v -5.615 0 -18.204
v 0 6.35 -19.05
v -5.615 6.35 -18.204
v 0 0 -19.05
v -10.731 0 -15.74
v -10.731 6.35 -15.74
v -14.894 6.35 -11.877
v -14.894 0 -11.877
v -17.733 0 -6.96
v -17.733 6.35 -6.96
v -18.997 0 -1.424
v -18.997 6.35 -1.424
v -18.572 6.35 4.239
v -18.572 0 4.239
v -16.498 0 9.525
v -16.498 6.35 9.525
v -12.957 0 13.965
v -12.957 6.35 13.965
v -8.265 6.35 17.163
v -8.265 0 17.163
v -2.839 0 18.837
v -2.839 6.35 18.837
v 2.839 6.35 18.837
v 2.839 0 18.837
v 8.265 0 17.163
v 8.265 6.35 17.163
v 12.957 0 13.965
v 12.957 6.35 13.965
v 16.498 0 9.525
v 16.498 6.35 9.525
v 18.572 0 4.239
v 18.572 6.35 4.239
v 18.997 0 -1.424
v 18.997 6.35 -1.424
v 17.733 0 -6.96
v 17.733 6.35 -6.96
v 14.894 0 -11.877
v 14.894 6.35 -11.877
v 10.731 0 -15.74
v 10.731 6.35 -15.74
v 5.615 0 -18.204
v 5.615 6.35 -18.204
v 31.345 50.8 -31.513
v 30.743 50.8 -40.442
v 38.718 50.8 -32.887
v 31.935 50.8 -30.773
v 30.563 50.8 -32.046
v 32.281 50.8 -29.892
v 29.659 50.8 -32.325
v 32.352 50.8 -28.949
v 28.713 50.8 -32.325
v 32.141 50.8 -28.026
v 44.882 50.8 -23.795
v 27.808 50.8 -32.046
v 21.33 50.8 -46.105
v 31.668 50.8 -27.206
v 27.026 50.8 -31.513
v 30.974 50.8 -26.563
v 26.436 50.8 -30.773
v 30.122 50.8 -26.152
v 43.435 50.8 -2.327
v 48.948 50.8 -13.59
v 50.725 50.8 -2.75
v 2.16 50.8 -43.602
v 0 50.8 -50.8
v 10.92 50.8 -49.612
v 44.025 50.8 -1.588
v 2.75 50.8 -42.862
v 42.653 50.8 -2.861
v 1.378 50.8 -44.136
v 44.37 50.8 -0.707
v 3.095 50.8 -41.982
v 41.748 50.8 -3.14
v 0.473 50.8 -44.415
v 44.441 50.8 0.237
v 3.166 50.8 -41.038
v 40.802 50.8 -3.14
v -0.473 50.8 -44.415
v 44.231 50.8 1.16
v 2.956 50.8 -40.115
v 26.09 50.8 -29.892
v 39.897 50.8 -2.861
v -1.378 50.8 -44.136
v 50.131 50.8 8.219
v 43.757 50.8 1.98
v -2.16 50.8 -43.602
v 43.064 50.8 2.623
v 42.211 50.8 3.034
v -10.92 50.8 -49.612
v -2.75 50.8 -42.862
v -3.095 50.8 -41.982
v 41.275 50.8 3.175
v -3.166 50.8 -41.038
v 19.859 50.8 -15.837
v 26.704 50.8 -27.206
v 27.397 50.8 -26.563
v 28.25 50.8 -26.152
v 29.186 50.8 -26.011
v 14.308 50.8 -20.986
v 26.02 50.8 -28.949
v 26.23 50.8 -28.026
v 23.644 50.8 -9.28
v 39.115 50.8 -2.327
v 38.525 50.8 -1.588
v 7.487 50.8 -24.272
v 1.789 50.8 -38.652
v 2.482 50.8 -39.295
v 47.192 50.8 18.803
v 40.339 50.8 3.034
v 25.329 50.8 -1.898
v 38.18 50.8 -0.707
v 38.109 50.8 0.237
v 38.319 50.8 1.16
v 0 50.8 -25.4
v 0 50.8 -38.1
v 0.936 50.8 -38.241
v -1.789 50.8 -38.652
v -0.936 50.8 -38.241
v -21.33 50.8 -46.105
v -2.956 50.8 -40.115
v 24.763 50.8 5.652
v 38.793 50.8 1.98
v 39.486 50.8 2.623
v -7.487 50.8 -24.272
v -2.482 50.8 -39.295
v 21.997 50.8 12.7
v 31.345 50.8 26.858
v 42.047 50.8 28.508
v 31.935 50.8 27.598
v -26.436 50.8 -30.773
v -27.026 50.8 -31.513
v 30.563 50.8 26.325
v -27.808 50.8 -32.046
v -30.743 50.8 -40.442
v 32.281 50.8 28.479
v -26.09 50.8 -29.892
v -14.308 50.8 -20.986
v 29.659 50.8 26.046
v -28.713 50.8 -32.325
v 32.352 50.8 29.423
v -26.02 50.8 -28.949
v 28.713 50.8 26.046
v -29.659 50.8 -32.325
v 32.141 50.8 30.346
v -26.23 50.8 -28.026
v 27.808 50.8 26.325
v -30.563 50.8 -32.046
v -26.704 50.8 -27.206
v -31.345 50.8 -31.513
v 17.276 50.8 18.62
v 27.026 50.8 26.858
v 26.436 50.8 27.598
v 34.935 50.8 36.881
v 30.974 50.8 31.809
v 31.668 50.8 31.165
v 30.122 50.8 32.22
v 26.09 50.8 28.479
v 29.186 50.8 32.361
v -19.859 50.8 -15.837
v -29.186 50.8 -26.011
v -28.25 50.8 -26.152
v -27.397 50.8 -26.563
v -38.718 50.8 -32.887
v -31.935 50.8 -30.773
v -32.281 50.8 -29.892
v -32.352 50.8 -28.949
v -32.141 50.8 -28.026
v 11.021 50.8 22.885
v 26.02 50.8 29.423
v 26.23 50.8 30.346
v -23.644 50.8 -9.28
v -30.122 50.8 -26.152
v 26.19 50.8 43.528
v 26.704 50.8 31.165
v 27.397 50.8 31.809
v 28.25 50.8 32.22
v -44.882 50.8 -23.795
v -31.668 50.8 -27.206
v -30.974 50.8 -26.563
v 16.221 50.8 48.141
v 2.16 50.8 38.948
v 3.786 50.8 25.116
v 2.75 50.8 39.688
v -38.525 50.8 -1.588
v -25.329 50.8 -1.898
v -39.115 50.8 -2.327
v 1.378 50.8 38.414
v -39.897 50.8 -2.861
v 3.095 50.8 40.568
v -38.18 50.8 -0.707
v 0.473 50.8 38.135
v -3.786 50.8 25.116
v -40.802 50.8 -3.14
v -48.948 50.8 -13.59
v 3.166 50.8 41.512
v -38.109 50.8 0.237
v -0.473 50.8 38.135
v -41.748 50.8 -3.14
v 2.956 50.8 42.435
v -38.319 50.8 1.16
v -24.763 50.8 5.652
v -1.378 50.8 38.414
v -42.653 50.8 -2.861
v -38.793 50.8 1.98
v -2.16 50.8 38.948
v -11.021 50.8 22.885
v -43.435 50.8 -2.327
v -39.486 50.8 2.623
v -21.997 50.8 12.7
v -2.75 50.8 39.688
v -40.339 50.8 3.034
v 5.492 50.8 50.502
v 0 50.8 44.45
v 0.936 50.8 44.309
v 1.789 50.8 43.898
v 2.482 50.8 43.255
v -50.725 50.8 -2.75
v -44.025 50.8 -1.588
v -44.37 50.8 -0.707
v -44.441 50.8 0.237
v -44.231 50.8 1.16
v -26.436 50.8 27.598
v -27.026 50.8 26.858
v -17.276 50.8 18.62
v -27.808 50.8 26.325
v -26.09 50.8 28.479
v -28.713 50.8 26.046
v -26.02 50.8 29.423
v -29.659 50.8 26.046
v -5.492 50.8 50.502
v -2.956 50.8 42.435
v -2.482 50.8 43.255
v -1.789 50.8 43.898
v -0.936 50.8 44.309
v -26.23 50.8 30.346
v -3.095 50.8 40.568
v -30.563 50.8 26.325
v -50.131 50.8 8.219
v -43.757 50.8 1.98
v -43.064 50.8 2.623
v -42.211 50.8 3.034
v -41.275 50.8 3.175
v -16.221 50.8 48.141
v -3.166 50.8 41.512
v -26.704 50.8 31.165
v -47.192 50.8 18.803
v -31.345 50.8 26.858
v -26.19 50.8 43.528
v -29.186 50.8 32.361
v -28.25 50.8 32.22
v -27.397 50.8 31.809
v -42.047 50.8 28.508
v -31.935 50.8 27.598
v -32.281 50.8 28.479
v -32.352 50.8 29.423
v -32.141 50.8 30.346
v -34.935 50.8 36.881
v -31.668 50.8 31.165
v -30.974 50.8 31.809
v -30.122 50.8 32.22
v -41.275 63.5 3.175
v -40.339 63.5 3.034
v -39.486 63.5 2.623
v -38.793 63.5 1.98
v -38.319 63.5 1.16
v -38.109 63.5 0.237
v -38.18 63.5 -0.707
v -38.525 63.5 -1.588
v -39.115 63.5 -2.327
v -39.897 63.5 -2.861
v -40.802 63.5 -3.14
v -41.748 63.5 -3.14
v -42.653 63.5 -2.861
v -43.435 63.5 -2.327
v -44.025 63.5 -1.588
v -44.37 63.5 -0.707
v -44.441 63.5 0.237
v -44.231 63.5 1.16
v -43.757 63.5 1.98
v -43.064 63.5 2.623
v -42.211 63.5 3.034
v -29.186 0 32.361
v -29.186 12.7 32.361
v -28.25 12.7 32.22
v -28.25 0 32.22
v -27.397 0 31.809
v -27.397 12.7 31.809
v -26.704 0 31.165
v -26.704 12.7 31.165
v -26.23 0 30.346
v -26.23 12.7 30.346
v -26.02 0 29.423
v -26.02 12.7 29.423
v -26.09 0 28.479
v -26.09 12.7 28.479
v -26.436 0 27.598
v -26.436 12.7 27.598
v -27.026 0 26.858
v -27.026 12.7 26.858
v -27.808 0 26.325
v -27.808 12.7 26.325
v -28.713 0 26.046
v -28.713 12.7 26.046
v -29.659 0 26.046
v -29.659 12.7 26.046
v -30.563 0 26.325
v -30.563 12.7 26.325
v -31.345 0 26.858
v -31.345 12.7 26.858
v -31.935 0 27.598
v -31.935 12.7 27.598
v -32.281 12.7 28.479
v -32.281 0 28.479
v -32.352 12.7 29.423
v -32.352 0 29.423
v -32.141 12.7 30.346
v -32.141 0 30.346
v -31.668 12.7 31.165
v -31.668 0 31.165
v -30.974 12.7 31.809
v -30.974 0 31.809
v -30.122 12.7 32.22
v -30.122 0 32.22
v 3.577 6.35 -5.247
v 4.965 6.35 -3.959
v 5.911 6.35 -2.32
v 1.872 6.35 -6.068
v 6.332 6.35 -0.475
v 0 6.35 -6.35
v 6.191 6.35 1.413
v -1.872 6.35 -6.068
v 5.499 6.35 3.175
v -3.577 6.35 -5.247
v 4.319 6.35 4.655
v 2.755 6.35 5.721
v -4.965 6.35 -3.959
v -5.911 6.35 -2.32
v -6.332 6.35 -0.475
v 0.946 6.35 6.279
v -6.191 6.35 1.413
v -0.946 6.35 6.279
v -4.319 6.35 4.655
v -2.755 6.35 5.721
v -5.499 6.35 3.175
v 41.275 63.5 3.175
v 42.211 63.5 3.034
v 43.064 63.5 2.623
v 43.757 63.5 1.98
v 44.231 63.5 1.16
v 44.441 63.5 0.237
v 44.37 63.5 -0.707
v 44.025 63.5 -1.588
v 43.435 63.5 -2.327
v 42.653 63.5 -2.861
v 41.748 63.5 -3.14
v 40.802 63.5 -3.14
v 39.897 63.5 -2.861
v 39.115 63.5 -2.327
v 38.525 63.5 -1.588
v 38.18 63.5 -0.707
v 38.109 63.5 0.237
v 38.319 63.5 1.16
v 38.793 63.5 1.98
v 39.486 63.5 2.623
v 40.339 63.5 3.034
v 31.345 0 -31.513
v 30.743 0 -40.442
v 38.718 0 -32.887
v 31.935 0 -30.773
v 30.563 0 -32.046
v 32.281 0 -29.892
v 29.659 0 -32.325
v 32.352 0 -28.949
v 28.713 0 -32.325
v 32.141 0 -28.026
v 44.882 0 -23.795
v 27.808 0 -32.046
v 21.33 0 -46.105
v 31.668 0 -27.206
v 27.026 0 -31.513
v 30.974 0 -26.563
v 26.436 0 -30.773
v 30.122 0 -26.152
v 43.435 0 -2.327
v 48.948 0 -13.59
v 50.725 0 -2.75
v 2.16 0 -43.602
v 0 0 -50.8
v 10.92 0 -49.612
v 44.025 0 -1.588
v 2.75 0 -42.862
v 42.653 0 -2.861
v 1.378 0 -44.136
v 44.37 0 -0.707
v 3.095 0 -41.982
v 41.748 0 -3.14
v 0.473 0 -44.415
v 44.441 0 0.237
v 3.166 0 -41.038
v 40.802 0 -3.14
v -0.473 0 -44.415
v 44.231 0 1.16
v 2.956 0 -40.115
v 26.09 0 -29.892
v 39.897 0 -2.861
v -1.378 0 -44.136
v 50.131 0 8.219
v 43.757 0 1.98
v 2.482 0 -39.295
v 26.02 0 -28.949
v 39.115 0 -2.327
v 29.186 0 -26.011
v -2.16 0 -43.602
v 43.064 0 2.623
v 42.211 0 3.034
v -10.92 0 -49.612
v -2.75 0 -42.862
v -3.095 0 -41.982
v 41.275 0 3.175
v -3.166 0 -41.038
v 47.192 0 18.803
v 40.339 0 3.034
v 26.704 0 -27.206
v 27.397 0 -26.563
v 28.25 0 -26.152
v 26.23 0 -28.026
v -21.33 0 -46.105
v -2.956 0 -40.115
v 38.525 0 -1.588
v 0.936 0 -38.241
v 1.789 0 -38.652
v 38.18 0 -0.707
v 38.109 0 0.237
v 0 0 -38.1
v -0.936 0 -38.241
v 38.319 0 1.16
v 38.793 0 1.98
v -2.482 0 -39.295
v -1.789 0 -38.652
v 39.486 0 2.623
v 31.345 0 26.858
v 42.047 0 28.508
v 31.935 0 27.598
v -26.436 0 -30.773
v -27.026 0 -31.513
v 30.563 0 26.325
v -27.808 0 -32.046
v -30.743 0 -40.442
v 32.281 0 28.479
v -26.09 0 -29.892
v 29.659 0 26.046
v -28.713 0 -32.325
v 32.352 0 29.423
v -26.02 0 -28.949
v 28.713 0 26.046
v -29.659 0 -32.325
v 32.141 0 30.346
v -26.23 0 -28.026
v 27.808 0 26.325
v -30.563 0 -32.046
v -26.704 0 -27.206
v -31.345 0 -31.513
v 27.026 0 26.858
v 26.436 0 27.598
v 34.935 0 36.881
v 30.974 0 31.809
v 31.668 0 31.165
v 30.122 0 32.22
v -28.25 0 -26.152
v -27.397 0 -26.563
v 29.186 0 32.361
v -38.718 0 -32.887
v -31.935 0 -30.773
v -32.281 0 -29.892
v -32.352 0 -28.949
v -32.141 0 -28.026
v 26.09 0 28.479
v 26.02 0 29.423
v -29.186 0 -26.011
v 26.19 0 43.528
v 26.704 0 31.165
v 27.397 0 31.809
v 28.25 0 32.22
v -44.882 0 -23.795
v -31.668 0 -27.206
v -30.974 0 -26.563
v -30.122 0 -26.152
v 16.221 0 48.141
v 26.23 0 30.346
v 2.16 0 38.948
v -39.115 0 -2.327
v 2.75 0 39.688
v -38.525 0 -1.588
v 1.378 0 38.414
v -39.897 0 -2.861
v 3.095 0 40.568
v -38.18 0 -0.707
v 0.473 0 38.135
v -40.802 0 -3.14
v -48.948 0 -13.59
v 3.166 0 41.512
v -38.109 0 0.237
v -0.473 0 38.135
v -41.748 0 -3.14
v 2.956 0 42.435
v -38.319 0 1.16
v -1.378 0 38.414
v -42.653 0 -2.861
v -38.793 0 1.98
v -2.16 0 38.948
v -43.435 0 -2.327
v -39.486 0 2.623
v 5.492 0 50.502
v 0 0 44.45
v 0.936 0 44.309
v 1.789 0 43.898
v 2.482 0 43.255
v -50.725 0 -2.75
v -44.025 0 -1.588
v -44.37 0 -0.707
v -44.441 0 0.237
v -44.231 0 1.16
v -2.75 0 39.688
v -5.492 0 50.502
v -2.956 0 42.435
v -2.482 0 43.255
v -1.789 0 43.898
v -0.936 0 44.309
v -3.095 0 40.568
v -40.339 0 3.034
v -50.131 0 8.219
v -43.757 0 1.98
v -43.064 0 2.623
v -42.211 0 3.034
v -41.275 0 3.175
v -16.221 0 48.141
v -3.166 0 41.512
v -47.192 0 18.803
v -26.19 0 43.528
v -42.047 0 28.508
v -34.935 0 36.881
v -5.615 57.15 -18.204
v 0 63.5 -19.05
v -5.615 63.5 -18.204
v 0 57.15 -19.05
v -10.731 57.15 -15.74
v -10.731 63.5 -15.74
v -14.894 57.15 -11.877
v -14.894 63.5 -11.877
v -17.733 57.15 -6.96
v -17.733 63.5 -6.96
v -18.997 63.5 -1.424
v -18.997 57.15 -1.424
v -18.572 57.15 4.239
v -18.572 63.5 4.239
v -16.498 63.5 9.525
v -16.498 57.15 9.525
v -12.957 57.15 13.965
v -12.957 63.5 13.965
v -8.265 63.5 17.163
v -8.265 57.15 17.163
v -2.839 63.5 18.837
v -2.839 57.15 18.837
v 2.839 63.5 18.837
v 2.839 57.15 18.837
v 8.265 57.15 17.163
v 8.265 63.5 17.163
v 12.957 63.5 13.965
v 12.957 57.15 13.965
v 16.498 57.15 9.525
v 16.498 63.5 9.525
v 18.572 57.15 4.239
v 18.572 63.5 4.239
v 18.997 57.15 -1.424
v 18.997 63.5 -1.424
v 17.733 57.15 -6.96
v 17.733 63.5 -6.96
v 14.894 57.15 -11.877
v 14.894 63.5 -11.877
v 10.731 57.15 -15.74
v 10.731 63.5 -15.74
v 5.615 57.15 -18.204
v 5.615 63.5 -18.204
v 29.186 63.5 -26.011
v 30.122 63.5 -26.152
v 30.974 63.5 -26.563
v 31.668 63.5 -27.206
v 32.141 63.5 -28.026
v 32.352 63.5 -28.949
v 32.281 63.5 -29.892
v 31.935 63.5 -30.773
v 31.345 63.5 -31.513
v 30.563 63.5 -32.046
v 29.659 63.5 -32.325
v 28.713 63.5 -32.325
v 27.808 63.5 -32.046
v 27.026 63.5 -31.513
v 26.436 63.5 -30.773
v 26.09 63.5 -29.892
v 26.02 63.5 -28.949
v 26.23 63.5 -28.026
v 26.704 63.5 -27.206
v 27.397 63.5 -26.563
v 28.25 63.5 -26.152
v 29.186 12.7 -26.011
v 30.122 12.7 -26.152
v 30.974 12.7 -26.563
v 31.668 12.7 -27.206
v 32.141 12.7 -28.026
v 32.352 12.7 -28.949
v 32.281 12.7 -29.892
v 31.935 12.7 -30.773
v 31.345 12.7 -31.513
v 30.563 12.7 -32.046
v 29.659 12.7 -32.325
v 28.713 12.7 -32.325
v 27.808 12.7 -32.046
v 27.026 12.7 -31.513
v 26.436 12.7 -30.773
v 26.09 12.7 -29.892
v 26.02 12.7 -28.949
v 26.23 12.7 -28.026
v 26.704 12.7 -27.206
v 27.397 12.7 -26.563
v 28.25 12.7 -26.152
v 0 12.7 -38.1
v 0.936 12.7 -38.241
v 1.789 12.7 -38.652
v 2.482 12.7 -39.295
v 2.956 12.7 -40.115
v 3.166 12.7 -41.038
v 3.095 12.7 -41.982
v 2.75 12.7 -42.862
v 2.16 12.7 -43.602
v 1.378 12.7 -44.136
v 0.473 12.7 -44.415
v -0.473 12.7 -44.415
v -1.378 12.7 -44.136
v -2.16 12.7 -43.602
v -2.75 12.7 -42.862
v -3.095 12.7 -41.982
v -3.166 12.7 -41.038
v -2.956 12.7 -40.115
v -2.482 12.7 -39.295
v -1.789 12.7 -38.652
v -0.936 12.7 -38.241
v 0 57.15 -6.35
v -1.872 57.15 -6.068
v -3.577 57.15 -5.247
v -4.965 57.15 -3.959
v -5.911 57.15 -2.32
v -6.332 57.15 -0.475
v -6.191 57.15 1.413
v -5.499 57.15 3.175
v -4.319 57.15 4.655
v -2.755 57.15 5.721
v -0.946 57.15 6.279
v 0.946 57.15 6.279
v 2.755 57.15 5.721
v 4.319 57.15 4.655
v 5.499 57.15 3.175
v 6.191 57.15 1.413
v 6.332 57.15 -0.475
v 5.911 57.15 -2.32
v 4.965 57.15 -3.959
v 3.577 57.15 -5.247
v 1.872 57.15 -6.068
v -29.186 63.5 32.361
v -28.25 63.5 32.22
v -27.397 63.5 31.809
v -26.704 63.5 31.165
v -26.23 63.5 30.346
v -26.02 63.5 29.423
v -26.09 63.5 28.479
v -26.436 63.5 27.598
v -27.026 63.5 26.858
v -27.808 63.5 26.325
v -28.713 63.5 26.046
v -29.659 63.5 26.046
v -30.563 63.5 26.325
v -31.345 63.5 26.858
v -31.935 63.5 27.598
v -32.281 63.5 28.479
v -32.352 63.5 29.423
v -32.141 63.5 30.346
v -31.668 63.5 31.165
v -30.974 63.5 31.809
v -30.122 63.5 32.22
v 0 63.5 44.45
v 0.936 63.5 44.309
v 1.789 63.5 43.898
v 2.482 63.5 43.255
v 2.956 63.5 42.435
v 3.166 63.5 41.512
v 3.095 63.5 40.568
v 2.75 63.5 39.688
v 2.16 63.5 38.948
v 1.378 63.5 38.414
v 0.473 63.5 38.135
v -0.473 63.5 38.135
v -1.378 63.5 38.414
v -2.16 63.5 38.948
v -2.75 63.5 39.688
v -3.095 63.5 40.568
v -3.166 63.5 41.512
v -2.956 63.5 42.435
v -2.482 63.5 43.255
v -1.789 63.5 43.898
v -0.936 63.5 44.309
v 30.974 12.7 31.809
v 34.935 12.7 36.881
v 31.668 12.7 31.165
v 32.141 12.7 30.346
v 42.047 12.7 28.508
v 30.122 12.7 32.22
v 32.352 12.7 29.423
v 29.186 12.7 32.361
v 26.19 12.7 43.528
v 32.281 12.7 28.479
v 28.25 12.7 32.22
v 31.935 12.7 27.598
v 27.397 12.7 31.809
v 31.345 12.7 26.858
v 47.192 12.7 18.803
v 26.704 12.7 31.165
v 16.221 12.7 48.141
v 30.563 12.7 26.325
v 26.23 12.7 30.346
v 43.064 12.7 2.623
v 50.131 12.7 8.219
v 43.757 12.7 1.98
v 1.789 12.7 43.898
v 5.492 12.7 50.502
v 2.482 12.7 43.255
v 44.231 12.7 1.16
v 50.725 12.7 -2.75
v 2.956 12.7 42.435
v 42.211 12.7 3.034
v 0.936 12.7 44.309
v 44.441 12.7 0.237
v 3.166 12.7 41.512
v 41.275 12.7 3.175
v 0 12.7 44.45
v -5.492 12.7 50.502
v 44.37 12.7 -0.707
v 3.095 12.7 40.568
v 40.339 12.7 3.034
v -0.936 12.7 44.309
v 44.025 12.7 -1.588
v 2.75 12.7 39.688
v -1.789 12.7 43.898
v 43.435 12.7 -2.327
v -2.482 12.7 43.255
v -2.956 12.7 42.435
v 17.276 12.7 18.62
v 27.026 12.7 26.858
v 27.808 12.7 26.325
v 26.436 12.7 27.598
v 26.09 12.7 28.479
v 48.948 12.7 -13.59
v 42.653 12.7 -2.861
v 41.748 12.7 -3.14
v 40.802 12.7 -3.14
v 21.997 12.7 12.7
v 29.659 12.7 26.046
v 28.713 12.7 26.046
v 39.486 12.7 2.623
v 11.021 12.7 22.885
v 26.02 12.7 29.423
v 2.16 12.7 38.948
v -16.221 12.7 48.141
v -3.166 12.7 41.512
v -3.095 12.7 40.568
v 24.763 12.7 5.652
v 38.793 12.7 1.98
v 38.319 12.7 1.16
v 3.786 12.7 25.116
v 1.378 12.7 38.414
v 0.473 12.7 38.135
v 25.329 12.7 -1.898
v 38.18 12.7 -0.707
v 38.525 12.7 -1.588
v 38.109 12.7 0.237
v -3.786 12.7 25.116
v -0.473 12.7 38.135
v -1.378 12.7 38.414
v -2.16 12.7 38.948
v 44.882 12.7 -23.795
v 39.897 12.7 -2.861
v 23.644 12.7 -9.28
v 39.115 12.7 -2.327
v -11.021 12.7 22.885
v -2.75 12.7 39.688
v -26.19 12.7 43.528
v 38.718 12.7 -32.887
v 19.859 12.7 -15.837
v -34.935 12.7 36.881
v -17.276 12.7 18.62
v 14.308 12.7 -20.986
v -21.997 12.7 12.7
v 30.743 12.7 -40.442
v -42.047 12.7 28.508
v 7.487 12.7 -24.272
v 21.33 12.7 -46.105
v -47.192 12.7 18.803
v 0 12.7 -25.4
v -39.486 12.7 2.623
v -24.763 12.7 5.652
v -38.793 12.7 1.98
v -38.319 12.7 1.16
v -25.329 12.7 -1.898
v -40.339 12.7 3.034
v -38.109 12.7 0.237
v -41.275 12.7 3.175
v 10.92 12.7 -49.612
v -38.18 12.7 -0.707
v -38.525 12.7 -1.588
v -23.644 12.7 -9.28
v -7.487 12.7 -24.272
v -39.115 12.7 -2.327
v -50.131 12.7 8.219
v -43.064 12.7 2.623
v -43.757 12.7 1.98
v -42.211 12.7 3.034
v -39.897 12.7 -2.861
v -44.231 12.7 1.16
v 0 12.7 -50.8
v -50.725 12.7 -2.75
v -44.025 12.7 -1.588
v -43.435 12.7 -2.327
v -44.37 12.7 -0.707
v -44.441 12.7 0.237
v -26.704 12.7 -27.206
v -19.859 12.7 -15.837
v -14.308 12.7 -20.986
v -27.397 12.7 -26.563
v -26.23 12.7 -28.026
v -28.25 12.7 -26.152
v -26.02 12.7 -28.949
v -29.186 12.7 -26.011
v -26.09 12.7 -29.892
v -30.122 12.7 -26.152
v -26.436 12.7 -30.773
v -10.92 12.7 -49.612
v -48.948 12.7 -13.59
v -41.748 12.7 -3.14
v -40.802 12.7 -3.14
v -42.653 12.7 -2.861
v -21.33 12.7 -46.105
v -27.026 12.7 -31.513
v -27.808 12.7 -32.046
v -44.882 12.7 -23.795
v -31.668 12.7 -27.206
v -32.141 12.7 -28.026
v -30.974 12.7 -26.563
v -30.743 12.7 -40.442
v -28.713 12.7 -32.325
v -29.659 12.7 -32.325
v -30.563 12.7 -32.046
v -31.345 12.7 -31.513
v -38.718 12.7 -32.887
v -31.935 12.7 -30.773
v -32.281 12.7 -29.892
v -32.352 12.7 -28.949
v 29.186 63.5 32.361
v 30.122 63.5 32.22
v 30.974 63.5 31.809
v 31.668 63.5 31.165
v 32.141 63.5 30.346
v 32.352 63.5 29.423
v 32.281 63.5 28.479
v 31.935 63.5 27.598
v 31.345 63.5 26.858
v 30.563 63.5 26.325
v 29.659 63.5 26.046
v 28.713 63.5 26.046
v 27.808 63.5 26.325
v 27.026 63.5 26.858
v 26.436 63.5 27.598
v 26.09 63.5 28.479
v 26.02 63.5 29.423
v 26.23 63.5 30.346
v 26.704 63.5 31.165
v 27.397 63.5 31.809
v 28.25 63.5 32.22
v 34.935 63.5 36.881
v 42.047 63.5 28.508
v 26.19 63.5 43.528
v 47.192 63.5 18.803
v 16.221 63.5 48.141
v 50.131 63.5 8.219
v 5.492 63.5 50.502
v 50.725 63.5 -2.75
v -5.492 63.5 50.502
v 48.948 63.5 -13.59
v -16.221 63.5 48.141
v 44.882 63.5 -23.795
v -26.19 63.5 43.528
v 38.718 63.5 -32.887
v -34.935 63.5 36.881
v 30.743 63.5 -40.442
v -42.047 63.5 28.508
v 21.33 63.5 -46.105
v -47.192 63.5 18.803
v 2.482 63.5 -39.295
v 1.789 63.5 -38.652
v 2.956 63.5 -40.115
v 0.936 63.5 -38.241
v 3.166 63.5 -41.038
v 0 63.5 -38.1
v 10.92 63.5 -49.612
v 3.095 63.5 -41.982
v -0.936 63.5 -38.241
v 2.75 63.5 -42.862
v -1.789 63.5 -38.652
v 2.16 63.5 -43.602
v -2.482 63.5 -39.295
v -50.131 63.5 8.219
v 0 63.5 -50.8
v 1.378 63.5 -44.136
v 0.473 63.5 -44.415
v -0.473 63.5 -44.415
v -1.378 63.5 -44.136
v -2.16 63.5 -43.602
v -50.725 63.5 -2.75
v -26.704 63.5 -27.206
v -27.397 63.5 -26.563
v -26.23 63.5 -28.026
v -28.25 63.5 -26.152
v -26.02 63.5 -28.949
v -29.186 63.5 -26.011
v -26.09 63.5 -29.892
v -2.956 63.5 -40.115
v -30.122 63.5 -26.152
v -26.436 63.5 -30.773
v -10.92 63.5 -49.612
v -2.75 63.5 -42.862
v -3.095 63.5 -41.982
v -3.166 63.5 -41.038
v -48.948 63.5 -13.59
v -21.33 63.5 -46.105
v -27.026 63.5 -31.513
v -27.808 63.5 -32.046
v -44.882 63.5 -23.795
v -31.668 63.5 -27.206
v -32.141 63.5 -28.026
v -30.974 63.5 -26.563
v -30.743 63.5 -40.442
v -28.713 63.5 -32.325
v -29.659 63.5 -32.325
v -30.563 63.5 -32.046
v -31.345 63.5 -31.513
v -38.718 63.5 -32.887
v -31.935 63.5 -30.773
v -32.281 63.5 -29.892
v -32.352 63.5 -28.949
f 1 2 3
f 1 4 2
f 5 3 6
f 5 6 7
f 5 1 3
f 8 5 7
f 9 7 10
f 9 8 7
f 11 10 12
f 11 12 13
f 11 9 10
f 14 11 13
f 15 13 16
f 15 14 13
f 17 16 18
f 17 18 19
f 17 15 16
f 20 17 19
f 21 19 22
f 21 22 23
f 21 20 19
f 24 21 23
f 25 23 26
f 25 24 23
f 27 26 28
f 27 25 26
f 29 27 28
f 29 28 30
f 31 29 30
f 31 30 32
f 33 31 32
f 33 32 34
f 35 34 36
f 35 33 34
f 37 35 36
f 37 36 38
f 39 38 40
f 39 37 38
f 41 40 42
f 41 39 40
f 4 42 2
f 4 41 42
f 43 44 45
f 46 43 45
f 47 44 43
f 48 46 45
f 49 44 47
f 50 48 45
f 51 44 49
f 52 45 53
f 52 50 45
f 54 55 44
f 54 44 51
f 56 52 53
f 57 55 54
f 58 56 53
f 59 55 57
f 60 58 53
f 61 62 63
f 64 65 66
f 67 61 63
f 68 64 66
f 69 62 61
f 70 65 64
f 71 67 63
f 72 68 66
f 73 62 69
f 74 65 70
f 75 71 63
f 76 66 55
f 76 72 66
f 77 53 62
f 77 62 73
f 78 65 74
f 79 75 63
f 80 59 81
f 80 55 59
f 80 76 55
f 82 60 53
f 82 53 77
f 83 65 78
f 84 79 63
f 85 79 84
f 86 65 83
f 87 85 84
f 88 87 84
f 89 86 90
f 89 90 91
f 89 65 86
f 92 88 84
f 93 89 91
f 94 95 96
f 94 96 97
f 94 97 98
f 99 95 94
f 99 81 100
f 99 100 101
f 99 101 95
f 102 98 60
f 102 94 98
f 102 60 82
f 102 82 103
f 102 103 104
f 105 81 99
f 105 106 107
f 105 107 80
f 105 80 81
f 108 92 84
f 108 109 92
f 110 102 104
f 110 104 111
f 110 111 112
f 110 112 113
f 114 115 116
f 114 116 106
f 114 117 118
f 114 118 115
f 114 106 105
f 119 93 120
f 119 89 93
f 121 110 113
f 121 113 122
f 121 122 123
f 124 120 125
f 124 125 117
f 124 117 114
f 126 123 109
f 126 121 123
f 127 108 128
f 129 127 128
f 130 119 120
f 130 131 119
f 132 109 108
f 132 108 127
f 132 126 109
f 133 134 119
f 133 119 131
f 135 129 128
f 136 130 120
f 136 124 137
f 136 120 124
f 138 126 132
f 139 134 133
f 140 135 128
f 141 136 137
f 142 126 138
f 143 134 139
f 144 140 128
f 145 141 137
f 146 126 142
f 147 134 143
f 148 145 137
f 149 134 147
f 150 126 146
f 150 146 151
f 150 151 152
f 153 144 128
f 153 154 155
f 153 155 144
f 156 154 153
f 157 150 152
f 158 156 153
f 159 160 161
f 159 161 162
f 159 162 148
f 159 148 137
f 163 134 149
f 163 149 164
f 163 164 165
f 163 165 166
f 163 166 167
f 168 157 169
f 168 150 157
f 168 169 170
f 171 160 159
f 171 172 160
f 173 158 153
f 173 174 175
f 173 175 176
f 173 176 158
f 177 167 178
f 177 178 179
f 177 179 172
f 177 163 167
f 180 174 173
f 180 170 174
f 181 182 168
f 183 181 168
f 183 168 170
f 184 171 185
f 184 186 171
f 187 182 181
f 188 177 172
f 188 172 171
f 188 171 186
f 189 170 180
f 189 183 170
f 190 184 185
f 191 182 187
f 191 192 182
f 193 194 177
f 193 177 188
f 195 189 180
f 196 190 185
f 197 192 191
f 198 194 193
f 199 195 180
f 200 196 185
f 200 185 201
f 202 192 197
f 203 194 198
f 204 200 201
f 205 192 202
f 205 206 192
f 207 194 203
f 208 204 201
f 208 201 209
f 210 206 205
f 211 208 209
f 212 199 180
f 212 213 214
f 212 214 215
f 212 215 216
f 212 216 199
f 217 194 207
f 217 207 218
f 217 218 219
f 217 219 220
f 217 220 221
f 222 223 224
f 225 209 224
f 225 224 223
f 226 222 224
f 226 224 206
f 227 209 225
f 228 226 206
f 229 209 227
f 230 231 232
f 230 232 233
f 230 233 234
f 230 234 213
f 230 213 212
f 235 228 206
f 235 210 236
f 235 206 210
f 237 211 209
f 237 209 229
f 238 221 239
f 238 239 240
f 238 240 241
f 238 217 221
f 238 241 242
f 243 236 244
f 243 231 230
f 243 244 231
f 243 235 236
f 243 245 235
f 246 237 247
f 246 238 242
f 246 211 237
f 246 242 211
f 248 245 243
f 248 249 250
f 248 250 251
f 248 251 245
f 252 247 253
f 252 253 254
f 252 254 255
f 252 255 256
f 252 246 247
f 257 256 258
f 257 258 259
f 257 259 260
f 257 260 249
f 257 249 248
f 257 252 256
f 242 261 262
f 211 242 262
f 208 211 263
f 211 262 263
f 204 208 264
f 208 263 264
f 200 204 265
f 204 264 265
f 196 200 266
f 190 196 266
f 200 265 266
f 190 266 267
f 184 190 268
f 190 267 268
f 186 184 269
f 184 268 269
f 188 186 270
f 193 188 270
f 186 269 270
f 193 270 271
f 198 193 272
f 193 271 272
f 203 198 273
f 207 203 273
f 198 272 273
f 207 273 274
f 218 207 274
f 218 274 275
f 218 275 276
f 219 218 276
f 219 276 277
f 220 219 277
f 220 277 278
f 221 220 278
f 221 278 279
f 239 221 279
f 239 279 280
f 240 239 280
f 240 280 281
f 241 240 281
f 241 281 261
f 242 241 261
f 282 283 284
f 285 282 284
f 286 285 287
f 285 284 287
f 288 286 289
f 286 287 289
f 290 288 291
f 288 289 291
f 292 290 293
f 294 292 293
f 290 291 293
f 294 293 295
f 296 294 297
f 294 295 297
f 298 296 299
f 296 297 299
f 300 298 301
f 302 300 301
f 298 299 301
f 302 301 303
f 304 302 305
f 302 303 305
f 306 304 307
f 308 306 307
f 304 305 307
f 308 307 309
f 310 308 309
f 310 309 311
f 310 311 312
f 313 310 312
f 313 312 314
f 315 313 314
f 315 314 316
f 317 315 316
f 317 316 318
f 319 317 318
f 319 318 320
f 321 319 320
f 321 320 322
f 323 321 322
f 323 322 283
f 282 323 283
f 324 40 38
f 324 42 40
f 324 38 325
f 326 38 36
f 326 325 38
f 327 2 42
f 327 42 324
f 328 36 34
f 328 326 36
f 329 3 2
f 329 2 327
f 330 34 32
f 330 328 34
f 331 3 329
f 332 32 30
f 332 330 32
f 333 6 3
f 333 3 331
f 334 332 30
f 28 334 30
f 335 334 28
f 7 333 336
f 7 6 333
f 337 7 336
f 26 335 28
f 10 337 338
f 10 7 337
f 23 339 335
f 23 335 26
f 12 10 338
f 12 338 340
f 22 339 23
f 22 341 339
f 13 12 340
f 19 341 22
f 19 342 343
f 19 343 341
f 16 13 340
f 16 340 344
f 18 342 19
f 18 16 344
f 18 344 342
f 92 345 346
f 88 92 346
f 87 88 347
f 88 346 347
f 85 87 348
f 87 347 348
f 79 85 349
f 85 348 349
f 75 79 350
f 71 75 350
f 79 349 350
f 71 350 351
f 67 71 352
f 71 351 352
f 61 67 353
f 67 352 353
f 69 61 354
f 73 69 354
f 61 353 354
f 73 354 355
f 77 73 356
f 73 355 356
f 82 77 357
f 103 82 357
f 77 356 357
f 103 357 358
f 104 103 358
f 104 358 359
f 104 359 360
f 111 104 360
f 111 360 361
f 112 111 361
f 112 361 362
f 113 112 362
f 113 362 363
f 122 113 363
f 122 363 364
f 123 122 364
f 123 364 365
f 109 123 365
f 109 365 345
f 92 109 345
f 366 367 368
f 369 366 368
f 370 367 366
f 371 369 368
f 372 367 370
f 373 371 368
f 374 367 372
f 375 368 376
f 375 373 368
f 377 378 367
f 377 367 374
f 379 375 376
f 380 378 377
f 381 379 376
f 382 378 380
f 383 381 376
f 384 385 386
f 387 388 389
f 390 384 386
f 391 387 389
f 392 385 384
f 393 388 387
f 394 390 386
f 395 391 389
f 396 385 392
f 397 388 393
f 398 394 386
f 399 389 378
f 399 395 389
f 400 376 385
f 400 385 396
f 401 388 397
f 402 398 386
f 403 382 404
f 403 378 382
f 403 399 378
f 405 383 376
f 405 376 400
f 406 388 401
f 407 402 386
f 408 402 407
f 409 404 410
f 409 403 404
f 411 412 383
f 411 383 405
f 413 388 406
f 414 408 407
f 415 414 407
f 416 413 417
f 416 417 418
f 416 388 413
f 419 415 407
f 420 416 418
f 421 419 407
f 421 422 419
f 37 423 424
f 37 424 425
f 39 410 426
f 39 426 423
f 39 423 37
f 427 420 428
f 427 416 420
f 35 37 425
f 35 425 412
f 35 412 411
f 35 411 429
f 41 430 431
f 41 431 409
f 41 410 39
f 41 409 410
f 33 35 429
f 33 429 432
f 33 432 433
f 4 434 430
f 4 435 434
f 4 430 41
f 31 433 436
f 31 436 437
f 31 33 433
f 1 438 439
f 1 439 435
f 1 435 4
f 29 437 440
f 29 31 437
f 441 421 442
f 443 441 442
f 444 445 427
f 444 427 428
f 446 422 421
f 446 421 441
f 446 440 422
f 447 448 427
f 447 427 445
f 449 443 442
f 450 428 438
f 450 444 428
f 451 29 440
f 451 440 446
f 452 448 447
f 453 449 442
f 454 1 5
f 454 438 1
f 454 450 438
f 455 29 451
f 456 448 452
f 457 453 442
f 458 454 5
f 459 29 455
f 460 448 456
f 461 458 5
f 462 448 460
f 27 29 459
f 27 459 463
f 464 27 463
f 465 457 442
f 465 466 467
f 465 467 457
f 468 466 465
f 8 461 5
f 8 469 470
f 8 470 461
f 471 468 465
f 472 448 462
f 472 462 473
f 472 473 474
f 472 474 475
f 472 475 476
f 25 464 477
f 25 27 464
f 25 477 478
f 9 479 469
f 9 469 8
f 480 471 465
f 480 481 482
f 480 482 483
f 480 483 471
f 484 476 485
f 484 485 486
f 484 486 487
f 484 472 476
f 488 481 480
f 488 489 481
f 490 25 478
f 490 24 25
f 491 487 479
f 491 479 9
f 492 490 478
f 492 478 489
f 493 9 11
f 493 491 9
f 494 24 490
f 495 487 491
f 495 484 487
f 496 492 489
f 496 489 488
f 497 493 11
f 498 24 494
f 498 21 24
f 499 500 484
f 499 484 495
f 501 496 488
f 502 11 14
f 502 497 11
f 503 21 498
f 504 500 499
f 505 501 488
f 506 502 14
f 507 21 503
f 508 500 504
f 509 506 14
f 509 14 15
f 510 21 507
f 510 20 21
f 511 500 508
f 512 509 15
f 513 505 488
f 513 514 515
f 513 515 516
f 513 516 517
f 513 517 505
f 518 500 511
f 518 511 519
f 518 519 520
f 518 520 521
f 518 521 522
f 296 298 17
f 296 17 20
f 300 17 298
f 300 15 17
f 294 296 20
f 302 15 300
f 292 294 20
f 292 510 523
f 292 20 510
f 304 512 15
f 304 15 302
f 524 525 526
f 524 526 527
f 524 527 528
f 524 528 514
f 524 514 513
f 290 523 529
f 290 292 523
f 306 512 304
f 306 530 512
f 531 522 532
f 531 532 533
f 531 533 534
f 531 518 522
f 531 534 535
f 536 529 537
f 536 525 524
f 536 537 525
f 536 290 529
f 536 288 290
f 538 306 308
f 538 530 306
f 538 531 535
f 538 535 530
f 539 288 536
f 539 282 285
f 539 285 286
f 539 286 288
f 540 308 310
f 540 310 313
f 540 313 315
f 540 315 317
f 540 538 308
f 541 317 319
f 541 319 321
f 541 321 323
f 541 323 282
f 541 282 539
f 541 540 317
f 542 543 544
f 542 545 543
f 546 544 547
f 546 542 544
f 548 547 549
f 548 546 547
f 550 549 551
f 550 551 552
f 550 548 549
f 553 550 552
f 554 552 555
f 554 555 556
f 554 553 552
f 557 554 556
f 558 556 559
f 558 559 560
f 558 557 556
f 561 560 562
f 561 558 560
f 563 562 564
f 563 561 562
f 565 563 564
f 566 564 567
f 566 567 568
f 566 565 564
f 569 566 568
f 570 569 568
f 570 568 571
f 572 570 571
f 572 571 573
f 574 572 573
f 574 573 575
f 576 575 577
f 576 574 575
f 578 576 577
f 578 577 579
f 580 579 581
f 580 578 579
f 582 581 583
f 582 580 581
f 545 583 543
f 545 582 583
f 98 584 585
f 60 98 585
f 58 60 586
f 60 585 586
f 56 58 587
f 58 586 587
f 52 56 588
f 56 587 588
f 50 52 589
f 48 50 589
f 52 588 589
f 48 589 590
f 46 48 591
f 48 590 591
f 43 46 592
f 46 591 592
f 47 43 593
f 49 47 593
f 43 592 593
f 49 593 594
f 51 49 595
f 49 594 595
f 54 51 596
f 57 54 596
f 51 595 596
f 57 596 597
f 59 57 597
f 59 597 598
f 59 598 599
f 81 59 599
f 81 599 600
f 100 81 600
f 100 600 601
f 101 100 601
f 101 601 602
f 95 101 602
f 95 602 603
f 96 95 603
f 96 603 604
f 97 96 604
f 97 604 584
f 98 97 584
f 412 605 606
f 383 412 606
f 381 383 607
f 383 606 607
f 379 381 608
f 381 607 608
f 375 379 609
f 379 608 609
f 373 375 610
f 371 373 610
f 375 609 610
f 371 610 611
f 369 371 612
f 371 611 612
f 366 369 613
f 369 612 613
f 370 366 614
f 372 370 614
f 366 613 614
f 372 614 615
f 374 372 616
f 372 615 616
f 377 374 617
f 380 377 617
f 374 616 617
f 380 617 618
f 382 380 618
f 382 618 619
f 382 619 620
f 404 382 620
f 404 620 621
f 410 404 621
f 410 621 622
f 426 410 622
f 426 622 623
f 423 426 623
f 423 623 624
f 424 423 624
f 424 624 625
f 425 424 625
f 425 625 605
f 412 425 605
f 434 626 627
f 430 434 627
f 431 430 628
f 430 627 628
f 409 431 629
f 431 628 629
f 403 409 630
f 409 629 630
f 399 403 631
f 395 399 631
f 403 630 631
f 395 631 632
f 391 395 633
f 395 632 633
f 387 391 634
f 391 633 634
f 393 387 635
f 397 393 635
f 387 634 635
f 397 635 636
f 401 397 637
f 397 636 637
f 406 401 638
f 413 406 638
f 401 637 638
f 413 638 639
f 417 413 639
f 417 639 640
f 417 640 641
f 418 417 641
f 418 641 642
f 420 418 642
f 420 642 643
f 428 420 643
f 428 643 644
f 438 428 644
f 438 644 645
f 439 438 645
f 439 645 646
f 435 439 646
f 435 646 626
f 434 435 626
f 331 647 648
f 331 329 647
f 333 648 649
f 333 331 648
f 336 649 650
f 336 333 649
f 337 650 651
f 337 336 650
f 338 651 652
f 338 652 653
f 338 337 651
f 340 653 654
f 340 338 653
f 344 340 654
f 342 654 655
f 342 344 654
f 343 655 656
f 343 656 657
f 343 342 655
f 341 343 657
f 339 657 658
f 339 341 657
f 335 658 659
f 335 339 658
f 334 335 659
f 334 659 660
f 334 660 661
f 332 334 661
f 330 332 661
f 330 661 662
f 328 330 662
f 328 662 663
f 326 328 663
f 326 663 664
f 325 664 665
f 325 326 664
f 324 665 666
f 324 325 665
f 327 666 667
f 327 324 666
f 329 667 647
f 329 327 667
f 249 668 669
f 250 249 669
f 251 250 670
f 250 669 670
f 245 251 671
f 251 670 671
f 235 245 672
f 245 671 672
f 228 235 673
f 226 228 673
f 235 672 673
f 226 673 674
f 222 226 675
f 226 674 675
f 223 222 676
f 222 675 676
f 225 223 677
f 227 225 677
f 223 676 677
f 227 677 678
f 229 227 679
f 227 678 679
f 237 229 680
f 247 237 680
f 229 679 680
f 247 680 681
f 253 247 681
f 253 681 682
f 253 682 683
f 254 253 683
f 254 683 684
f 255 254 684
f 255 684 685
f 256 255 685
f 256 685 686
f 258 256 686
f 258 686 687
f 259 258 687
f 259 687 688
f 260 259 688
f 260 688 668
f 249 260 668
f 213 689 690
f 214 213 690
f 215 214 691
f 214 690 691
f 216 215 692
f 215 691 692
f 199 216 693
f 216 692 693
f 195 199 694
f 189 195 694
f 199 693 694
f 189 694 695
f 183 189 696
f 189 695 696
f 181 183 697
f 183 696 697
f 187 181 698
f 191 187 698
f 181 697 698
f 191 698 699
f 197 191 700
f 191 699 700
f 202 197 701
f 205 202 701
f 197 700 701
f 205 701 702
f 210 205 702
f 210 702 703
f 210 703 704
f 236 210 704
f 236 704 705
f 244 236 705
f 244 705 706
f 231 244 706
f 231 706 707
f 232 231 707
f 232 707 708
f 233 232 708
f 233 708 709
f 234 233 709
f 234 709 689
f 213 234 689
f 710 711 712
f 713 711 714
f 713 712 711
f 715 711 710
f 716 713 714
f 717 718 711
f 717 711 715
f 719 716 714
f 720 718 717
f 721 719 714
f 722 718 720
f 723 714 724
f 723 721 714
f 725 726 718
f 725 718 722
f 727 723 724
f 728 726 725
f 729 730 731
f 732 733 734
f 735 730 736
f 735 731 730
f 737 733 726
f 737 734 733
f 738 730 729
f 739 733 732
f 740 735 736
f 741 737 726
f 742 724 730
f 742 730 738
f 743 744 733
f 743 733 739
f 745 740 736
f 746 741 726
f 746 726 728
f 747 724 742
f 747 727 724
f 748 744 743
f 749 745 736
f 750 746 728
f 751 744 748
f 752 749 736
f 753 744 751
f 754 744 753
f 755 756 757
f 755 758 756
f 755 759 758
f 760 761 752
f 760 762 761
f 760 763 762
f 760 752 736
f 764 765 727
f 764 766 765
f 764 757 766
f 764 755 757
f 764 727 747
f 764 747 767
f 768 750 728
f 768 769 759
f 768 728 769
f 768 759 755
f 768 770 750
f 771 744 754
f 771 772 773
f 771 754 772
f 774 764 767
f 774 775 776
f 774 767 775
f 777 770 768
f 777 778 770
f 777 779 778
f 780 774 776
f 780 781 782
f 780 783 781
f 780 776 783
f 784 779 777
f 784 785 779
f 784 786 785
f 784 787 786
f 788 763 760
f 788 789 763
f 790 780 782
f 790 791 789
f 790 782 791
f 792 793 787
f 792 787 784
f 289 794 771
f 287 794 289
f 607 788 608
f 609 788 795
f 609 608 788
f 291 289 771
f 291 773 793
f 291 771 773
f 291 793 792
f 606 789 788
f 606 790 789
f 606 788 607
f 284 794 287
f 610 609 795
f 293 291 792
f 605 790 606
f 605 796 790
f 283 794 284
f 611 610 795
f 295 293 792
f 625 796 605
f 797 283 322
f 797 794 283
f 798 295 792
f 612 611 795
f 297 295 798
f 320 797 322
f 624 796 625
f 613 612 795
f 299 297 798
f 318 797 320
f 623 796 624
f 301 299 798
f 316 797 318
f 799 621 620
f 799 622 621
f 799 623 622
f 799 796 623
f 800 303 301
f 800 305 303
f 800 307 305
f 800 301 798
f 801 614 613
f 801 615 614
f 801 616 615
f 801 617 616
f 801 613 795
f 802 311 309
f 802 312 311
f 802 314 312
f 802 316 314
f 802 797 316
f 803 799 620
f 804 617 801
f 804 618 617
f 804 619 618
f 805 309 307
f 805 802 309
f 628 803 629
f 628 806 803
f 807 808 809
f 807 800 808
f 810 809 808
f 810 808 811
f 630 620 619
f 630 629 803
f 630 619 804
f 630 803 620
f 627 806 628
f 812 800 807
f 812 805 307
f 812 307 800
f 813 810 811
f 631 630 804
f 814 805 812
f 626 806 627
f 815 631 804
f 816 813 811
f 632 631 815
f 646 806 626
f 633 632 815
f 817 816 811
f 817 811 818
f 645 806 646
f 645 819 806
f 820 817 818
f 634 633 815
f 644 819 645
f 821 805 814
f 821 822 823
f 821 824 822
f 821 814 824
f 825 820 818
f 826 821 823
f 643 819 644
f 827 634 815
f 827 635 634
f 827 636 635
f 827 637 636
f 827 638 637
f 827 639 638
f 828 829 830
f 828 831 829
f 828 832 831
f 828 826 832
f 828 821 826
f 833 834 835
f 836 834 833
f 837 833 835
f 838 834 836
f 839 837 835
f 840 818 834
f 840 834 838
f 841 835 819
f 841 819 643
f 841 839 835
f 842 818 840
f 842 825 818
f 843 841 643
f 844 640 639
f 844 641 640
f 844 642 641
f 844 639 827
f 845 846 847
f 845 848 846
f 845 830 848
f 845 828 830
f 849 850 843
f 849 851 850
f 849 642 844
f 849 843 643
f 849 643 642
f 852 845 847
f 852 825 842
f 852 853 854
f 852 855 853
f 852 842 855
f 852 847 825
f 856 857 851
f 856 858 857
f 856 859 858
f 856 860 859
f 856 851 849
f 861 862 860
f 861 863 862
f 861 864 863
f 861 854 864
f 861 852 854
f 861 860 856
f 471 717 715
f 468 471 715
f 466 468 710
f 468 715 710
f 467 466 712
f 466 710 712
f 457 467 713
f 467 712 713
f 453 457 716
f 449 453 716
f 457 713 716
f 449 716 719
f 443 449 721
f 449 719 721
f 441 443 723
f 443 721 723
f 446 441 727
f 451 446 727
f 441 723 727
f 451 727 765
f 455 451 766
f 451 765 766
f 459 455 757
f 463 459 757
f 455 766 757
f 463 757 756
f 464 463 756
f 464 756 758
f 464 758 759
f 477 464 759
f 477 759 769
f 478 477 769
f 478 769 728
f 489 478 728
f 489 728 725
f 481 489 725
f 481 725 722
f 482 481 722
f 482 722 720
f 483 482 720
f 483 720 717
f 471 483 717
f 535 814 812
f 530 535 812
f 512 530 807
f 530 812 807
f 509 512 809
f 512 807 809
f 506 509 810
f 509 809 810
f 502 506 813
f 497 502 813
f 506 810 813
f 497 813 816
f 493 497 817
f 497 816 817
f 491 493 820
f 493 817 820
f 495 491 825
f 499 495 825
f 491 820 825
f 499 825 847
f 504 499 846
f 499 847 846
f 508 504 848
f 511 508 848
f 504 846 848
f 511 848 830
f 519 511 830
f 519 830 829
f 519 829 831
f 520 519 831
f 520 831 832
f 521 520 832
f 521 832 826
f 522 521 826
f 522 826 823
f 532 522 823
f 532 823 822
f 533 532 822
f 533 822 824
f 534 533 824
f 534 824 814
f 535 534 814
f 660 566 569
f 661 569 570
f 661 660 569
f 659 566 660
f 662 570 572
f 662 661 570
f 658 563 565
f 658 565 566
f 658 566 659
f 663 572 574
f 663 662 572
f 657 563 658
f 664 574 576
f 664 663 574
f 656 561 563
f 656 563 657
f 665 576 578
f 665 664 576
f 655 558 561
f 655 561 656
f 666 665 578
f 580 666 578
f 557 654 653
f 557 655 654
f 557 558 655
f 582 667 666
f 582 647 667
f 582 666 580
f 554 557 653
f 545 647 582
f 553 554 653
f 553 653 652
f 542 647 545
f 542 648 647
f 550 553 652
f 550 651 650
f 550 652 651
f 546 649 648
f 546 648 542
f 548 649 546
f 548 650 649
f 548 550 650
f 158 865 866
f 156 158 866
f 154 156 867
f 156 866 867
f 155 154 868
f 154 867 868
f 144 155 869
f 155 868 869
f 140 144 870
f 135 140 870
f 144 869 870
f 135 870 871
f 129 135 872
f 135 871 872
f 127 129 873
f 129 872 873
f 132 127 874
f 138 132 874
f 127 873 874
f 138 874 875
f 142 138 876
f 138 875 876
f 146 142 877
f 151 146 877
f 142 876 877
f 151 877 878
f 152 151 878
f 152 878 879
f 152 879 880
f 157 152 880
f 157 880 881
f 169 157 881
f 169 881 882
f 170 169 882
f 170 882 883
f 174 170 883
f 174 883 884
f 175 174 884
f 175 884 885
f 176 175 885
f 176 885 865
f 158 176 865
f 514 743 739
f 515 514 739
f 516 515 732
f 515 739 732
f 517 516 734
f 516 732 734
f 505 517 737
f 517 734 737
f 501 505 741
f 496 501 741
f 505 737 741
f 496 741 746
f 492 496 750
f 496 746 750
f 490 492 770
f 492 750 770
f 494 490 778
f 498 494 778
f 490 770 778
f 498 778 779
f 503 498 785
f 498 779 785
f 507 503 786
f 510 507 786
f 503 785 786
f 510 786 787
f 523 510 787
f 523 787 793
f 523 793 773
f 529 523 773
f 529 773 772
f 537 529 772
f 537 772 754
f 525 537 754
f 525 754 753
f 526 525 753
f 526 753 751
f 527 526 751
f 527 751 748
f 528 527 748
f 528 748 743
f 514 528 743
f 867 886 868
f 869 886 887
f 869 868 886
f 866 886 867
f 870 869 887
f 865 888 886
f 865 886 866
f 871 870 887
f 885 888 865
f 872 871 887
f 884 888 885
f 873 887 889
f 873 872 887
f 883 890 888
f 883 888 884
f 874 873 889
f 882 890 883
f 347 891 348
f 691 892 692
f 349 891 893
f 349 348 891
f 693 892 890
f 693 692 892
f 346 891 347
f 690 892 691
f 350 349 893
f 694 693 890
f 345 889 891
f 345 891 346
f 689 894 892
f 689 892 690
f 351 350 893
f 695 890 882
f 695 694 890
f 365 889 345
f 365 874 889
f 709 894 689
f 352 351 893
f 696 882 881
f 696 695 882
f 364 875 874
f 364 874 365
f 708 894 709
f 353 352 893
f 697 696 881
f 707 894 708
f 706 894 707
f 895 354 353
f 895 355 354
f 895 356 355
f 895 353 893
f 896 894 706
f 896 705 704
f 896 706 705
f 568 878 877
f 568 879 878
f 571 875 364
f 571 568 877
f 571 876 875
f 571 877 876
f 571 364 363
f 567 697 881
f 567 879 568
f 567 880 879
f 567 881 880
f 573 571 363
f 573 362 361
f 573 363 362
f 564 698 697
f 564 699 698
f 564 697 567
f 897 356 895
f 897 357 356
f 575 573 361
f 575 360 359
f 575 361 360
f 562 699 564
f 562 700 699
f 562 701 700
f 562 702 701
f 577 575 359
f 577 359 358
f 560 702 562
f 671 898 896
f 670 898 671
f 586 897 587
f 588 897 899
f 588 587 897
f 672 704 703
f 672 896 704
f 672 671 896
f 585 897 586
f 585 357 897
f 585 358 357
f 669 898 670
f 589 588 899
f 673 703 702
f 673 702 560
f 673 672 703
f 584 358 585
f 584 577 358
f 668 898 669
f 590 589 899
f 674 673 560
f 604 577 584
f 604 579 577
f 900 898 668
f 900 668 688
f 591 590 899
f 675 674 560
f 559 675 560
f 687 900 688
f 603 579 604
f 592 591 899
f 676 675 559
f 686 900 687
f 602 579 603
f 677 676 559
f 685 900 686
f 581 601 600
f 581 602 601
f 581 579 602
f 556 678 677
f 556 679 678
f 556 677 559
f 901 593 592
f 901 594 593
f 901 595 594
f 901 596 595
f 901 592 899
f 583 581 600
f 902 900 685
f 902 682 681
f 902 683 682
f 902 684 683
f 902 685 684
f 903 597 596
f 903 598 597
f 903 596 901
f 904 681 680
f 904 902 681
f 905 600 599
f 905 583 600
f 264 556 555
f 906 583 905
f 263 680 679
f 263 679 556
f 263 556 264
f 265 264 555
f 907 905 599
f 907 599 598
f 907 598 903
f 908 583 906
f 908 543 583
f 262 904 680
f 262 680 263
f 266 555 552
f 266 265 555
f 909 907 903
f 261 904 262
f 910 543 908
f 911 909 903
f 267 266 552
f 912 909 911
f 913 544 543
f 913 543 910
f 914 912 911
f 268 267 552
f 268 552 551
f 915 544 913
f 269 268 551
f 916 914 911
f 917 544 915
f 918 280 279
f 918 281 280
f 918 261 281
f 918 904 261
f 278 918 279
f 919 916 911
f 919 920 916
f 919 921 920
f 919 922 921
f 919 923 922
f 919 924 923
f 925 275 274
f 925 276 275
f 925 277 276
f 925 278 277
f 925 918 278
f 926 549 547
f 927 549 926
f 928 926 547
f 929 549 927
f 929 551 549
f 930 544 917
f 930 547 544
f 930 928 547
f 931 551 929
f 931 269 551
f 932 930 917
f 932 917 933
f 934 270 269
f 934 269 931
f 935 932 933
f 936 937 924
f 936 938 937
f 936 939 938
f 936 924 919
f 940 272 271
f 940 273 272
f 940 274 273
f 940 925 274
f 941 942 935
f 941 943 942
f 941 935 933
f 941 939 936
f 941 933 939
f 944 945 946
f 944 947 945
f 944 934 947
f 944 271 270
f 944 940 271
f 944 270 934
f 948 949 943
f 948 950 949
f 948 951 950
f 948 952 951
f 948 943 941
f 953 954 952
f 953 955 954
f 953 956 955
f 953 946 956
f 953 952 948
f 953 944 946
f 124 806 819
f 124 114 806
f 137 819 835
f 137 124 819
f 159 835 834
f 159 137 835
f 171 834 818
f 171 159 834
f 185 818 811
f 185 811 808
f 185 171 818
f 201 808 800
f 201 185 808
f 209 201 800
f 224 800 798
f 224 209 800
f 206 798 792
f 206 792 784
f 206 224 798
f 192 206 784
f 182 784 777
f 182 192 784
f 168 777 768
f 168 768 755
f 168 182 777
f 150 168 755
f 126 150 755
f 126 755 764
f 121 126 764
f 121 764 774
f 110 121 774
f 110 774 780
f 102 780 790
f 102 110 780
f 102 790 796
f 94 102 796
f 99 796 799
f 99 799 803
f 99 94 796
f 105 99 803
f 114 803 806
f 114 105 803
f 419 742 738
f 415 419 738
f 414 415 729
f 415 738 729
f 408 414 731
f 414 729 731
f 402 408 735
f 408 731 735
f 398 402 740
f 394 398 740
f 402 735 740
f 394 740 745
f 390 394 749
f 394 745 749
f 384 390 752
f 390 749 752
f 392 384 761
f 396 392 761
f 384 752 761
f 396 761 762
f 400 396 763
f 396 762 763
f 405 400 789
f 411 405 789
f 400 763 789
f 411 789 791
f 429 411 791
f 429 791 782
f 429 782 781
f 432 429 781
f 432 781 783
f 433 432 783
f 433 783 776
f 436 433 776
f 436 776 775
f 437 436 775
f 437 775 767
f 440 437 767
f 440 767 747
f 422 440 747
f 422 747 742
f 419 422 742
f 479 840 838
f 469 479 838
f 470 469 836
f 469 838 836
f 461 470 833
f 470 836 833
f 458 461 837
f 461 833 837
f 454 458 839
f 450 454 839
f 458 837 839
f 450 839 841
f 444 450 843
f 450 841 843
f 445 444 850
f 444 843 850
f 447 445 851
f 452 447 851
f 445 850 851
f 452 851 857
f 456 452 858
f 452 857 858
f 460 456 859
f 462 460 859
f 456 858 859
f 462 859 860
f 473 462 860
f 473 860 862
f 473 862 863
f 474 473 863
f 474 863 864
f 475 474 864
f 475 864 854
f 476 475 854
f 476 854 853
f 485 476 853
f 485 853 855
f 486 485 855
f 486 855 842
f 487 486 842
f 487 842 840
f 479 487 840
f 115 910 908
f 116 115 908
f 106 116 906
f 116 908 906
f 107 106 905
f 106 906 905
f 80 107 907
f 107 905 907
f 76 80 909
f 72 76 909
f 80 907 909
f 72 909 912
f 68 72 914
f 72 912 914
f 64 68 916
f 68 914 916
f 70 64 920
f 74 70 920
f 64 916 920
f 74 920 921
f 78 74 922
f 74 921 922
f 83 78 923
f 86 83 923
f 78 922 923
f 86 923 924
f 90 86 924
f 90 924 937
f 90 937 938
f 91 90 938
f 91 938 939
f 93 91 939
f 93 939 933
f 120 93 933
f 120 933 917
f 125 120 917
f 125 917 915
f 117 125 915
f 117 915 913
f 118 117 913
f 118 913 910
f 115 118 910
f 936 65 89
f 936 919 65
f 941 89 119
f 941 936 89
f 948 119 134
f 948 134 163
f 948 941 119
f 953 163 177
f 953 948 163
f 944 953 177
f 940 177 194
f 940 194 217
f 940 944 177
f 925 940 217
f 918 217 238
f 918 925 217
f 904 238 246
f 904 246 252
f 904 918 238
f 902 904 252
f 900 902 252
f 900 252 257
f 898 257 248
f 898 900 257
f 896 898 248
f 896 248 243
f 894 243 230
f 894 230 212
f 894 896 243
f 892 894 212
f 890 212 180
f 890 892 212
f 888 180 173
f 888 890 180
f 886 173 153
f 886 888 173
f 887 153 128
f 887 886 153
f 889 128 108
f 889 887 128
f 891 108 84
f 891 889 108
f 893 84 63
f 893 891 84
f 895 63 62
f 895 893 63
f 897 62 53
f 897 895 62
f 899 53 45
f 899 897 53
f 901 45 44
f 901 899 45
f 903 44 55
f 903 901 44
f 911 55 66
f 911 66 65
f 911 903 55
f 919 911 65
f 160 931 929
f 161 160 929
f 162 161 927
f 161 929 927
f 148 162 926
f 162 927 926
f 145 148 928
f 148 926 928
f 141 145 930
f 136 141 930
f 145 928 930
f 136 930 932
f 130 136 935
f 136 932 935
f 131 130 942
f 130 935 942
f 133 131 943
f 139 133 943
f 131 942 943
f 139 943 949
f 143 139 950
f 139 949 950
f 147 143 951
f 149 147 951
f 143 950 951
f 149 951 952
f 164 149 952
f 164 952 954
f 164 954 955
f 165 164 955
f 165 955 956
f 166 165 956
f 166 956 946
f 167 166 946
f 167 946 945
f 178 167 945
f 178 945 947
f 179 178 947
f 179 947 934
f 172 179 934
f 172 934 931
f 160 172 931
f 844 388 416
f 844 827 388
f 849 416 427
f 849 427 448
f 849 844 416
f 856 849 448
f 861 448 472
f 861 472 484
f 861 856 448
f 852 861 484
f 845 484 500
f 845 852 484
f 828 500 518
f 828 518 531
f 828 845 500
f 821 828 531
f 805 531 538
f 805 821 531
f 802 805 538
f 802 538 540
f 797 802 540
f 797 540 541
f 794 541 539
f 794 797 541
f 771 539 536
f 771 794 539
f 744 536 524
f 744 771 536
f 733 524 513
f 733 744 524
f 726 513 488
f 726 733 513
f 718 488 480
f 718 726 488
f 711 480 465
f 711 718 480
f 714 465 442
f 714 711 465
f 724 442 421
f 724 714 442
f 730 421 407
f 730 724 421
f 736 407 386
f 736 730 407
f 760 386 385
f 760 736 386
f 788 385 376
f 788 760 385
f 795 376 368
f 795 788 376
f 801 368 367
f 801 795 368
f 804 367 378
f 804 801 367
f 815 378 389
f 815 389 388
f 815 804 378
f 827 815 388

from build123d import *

# Parameters (mm, degrees)
SKETCH2_R          = 3.175
CUT_EXTRUDE1_DEPTH = 96.882897328


with BuildPart() as part:
    # Sketch1 → Revolve2 (revolve)
    with BuildSketch(Plane.XY, mode=Mode.PRIVATE) as revolve2_sk:
        Polygon((19.05, 0), (50.8, 0), (50.8, 12.7), (25.4, 12.7), (25.4, 50.8), (50.8, 50.8), (50.8, 63.5), (19.05, 63.5), (19.05, 57.15), (6.35, 57.15), (6.35, 6.35), (19.05, 6.35), align=None)
    revolve(revolve2_sk.sketch.rotate(Axis((0, 0, 0), (0, 1, 0)), 90), axis=Axis((0, 0, 0), (0, 1, 0)))

    # Sketch2 → Cut-Extrude1 (cut, through all)
    with BuildSketch(Plane(origin=(0, 63.5, 0), x_dir=(1, 0, 0), z_dir=(0, 1, 0))):
        with Locations(Location((41.275, 0, 0), (0, 0, 270))):
            Circle(SKETCH2_R)
        with Locations(Location((29.185832393, -29.185832393, 0), (0, 0, 270))):
            Circle(SKETCH2_R)
        with Locations(Location((0, -41.275, 0), (0, 0, 270))):
            Circle(SKETCH2_R)
        with Locations(Location((-29.185832393, -29.185832393, 0), (0, 0, 270))):
            Circle(SKETCH2_R)
        with Locations(Location((-41.275, 0, 0), (0, 0, 270))):
            Circle(SKETCH2_R)
        with Locations(Location((-29.185832393, 29.185832393, 0), (0, 0, 270))):
            Circle(SKETCH2_R)
        with Locations(Location((0, 41.275, 0), (0, 0, 270))):
            Circle(SKETCH2_R)
        with Locations(Location((29.185832393, 29.185832393, 0), (0, 0, 270))):
            Circle(SKETCH2_R)
    extrude(amount=-CUT_EXTRUDE1_DEPTH, mode=Mode.SUBTRACT)


solid = part.part
